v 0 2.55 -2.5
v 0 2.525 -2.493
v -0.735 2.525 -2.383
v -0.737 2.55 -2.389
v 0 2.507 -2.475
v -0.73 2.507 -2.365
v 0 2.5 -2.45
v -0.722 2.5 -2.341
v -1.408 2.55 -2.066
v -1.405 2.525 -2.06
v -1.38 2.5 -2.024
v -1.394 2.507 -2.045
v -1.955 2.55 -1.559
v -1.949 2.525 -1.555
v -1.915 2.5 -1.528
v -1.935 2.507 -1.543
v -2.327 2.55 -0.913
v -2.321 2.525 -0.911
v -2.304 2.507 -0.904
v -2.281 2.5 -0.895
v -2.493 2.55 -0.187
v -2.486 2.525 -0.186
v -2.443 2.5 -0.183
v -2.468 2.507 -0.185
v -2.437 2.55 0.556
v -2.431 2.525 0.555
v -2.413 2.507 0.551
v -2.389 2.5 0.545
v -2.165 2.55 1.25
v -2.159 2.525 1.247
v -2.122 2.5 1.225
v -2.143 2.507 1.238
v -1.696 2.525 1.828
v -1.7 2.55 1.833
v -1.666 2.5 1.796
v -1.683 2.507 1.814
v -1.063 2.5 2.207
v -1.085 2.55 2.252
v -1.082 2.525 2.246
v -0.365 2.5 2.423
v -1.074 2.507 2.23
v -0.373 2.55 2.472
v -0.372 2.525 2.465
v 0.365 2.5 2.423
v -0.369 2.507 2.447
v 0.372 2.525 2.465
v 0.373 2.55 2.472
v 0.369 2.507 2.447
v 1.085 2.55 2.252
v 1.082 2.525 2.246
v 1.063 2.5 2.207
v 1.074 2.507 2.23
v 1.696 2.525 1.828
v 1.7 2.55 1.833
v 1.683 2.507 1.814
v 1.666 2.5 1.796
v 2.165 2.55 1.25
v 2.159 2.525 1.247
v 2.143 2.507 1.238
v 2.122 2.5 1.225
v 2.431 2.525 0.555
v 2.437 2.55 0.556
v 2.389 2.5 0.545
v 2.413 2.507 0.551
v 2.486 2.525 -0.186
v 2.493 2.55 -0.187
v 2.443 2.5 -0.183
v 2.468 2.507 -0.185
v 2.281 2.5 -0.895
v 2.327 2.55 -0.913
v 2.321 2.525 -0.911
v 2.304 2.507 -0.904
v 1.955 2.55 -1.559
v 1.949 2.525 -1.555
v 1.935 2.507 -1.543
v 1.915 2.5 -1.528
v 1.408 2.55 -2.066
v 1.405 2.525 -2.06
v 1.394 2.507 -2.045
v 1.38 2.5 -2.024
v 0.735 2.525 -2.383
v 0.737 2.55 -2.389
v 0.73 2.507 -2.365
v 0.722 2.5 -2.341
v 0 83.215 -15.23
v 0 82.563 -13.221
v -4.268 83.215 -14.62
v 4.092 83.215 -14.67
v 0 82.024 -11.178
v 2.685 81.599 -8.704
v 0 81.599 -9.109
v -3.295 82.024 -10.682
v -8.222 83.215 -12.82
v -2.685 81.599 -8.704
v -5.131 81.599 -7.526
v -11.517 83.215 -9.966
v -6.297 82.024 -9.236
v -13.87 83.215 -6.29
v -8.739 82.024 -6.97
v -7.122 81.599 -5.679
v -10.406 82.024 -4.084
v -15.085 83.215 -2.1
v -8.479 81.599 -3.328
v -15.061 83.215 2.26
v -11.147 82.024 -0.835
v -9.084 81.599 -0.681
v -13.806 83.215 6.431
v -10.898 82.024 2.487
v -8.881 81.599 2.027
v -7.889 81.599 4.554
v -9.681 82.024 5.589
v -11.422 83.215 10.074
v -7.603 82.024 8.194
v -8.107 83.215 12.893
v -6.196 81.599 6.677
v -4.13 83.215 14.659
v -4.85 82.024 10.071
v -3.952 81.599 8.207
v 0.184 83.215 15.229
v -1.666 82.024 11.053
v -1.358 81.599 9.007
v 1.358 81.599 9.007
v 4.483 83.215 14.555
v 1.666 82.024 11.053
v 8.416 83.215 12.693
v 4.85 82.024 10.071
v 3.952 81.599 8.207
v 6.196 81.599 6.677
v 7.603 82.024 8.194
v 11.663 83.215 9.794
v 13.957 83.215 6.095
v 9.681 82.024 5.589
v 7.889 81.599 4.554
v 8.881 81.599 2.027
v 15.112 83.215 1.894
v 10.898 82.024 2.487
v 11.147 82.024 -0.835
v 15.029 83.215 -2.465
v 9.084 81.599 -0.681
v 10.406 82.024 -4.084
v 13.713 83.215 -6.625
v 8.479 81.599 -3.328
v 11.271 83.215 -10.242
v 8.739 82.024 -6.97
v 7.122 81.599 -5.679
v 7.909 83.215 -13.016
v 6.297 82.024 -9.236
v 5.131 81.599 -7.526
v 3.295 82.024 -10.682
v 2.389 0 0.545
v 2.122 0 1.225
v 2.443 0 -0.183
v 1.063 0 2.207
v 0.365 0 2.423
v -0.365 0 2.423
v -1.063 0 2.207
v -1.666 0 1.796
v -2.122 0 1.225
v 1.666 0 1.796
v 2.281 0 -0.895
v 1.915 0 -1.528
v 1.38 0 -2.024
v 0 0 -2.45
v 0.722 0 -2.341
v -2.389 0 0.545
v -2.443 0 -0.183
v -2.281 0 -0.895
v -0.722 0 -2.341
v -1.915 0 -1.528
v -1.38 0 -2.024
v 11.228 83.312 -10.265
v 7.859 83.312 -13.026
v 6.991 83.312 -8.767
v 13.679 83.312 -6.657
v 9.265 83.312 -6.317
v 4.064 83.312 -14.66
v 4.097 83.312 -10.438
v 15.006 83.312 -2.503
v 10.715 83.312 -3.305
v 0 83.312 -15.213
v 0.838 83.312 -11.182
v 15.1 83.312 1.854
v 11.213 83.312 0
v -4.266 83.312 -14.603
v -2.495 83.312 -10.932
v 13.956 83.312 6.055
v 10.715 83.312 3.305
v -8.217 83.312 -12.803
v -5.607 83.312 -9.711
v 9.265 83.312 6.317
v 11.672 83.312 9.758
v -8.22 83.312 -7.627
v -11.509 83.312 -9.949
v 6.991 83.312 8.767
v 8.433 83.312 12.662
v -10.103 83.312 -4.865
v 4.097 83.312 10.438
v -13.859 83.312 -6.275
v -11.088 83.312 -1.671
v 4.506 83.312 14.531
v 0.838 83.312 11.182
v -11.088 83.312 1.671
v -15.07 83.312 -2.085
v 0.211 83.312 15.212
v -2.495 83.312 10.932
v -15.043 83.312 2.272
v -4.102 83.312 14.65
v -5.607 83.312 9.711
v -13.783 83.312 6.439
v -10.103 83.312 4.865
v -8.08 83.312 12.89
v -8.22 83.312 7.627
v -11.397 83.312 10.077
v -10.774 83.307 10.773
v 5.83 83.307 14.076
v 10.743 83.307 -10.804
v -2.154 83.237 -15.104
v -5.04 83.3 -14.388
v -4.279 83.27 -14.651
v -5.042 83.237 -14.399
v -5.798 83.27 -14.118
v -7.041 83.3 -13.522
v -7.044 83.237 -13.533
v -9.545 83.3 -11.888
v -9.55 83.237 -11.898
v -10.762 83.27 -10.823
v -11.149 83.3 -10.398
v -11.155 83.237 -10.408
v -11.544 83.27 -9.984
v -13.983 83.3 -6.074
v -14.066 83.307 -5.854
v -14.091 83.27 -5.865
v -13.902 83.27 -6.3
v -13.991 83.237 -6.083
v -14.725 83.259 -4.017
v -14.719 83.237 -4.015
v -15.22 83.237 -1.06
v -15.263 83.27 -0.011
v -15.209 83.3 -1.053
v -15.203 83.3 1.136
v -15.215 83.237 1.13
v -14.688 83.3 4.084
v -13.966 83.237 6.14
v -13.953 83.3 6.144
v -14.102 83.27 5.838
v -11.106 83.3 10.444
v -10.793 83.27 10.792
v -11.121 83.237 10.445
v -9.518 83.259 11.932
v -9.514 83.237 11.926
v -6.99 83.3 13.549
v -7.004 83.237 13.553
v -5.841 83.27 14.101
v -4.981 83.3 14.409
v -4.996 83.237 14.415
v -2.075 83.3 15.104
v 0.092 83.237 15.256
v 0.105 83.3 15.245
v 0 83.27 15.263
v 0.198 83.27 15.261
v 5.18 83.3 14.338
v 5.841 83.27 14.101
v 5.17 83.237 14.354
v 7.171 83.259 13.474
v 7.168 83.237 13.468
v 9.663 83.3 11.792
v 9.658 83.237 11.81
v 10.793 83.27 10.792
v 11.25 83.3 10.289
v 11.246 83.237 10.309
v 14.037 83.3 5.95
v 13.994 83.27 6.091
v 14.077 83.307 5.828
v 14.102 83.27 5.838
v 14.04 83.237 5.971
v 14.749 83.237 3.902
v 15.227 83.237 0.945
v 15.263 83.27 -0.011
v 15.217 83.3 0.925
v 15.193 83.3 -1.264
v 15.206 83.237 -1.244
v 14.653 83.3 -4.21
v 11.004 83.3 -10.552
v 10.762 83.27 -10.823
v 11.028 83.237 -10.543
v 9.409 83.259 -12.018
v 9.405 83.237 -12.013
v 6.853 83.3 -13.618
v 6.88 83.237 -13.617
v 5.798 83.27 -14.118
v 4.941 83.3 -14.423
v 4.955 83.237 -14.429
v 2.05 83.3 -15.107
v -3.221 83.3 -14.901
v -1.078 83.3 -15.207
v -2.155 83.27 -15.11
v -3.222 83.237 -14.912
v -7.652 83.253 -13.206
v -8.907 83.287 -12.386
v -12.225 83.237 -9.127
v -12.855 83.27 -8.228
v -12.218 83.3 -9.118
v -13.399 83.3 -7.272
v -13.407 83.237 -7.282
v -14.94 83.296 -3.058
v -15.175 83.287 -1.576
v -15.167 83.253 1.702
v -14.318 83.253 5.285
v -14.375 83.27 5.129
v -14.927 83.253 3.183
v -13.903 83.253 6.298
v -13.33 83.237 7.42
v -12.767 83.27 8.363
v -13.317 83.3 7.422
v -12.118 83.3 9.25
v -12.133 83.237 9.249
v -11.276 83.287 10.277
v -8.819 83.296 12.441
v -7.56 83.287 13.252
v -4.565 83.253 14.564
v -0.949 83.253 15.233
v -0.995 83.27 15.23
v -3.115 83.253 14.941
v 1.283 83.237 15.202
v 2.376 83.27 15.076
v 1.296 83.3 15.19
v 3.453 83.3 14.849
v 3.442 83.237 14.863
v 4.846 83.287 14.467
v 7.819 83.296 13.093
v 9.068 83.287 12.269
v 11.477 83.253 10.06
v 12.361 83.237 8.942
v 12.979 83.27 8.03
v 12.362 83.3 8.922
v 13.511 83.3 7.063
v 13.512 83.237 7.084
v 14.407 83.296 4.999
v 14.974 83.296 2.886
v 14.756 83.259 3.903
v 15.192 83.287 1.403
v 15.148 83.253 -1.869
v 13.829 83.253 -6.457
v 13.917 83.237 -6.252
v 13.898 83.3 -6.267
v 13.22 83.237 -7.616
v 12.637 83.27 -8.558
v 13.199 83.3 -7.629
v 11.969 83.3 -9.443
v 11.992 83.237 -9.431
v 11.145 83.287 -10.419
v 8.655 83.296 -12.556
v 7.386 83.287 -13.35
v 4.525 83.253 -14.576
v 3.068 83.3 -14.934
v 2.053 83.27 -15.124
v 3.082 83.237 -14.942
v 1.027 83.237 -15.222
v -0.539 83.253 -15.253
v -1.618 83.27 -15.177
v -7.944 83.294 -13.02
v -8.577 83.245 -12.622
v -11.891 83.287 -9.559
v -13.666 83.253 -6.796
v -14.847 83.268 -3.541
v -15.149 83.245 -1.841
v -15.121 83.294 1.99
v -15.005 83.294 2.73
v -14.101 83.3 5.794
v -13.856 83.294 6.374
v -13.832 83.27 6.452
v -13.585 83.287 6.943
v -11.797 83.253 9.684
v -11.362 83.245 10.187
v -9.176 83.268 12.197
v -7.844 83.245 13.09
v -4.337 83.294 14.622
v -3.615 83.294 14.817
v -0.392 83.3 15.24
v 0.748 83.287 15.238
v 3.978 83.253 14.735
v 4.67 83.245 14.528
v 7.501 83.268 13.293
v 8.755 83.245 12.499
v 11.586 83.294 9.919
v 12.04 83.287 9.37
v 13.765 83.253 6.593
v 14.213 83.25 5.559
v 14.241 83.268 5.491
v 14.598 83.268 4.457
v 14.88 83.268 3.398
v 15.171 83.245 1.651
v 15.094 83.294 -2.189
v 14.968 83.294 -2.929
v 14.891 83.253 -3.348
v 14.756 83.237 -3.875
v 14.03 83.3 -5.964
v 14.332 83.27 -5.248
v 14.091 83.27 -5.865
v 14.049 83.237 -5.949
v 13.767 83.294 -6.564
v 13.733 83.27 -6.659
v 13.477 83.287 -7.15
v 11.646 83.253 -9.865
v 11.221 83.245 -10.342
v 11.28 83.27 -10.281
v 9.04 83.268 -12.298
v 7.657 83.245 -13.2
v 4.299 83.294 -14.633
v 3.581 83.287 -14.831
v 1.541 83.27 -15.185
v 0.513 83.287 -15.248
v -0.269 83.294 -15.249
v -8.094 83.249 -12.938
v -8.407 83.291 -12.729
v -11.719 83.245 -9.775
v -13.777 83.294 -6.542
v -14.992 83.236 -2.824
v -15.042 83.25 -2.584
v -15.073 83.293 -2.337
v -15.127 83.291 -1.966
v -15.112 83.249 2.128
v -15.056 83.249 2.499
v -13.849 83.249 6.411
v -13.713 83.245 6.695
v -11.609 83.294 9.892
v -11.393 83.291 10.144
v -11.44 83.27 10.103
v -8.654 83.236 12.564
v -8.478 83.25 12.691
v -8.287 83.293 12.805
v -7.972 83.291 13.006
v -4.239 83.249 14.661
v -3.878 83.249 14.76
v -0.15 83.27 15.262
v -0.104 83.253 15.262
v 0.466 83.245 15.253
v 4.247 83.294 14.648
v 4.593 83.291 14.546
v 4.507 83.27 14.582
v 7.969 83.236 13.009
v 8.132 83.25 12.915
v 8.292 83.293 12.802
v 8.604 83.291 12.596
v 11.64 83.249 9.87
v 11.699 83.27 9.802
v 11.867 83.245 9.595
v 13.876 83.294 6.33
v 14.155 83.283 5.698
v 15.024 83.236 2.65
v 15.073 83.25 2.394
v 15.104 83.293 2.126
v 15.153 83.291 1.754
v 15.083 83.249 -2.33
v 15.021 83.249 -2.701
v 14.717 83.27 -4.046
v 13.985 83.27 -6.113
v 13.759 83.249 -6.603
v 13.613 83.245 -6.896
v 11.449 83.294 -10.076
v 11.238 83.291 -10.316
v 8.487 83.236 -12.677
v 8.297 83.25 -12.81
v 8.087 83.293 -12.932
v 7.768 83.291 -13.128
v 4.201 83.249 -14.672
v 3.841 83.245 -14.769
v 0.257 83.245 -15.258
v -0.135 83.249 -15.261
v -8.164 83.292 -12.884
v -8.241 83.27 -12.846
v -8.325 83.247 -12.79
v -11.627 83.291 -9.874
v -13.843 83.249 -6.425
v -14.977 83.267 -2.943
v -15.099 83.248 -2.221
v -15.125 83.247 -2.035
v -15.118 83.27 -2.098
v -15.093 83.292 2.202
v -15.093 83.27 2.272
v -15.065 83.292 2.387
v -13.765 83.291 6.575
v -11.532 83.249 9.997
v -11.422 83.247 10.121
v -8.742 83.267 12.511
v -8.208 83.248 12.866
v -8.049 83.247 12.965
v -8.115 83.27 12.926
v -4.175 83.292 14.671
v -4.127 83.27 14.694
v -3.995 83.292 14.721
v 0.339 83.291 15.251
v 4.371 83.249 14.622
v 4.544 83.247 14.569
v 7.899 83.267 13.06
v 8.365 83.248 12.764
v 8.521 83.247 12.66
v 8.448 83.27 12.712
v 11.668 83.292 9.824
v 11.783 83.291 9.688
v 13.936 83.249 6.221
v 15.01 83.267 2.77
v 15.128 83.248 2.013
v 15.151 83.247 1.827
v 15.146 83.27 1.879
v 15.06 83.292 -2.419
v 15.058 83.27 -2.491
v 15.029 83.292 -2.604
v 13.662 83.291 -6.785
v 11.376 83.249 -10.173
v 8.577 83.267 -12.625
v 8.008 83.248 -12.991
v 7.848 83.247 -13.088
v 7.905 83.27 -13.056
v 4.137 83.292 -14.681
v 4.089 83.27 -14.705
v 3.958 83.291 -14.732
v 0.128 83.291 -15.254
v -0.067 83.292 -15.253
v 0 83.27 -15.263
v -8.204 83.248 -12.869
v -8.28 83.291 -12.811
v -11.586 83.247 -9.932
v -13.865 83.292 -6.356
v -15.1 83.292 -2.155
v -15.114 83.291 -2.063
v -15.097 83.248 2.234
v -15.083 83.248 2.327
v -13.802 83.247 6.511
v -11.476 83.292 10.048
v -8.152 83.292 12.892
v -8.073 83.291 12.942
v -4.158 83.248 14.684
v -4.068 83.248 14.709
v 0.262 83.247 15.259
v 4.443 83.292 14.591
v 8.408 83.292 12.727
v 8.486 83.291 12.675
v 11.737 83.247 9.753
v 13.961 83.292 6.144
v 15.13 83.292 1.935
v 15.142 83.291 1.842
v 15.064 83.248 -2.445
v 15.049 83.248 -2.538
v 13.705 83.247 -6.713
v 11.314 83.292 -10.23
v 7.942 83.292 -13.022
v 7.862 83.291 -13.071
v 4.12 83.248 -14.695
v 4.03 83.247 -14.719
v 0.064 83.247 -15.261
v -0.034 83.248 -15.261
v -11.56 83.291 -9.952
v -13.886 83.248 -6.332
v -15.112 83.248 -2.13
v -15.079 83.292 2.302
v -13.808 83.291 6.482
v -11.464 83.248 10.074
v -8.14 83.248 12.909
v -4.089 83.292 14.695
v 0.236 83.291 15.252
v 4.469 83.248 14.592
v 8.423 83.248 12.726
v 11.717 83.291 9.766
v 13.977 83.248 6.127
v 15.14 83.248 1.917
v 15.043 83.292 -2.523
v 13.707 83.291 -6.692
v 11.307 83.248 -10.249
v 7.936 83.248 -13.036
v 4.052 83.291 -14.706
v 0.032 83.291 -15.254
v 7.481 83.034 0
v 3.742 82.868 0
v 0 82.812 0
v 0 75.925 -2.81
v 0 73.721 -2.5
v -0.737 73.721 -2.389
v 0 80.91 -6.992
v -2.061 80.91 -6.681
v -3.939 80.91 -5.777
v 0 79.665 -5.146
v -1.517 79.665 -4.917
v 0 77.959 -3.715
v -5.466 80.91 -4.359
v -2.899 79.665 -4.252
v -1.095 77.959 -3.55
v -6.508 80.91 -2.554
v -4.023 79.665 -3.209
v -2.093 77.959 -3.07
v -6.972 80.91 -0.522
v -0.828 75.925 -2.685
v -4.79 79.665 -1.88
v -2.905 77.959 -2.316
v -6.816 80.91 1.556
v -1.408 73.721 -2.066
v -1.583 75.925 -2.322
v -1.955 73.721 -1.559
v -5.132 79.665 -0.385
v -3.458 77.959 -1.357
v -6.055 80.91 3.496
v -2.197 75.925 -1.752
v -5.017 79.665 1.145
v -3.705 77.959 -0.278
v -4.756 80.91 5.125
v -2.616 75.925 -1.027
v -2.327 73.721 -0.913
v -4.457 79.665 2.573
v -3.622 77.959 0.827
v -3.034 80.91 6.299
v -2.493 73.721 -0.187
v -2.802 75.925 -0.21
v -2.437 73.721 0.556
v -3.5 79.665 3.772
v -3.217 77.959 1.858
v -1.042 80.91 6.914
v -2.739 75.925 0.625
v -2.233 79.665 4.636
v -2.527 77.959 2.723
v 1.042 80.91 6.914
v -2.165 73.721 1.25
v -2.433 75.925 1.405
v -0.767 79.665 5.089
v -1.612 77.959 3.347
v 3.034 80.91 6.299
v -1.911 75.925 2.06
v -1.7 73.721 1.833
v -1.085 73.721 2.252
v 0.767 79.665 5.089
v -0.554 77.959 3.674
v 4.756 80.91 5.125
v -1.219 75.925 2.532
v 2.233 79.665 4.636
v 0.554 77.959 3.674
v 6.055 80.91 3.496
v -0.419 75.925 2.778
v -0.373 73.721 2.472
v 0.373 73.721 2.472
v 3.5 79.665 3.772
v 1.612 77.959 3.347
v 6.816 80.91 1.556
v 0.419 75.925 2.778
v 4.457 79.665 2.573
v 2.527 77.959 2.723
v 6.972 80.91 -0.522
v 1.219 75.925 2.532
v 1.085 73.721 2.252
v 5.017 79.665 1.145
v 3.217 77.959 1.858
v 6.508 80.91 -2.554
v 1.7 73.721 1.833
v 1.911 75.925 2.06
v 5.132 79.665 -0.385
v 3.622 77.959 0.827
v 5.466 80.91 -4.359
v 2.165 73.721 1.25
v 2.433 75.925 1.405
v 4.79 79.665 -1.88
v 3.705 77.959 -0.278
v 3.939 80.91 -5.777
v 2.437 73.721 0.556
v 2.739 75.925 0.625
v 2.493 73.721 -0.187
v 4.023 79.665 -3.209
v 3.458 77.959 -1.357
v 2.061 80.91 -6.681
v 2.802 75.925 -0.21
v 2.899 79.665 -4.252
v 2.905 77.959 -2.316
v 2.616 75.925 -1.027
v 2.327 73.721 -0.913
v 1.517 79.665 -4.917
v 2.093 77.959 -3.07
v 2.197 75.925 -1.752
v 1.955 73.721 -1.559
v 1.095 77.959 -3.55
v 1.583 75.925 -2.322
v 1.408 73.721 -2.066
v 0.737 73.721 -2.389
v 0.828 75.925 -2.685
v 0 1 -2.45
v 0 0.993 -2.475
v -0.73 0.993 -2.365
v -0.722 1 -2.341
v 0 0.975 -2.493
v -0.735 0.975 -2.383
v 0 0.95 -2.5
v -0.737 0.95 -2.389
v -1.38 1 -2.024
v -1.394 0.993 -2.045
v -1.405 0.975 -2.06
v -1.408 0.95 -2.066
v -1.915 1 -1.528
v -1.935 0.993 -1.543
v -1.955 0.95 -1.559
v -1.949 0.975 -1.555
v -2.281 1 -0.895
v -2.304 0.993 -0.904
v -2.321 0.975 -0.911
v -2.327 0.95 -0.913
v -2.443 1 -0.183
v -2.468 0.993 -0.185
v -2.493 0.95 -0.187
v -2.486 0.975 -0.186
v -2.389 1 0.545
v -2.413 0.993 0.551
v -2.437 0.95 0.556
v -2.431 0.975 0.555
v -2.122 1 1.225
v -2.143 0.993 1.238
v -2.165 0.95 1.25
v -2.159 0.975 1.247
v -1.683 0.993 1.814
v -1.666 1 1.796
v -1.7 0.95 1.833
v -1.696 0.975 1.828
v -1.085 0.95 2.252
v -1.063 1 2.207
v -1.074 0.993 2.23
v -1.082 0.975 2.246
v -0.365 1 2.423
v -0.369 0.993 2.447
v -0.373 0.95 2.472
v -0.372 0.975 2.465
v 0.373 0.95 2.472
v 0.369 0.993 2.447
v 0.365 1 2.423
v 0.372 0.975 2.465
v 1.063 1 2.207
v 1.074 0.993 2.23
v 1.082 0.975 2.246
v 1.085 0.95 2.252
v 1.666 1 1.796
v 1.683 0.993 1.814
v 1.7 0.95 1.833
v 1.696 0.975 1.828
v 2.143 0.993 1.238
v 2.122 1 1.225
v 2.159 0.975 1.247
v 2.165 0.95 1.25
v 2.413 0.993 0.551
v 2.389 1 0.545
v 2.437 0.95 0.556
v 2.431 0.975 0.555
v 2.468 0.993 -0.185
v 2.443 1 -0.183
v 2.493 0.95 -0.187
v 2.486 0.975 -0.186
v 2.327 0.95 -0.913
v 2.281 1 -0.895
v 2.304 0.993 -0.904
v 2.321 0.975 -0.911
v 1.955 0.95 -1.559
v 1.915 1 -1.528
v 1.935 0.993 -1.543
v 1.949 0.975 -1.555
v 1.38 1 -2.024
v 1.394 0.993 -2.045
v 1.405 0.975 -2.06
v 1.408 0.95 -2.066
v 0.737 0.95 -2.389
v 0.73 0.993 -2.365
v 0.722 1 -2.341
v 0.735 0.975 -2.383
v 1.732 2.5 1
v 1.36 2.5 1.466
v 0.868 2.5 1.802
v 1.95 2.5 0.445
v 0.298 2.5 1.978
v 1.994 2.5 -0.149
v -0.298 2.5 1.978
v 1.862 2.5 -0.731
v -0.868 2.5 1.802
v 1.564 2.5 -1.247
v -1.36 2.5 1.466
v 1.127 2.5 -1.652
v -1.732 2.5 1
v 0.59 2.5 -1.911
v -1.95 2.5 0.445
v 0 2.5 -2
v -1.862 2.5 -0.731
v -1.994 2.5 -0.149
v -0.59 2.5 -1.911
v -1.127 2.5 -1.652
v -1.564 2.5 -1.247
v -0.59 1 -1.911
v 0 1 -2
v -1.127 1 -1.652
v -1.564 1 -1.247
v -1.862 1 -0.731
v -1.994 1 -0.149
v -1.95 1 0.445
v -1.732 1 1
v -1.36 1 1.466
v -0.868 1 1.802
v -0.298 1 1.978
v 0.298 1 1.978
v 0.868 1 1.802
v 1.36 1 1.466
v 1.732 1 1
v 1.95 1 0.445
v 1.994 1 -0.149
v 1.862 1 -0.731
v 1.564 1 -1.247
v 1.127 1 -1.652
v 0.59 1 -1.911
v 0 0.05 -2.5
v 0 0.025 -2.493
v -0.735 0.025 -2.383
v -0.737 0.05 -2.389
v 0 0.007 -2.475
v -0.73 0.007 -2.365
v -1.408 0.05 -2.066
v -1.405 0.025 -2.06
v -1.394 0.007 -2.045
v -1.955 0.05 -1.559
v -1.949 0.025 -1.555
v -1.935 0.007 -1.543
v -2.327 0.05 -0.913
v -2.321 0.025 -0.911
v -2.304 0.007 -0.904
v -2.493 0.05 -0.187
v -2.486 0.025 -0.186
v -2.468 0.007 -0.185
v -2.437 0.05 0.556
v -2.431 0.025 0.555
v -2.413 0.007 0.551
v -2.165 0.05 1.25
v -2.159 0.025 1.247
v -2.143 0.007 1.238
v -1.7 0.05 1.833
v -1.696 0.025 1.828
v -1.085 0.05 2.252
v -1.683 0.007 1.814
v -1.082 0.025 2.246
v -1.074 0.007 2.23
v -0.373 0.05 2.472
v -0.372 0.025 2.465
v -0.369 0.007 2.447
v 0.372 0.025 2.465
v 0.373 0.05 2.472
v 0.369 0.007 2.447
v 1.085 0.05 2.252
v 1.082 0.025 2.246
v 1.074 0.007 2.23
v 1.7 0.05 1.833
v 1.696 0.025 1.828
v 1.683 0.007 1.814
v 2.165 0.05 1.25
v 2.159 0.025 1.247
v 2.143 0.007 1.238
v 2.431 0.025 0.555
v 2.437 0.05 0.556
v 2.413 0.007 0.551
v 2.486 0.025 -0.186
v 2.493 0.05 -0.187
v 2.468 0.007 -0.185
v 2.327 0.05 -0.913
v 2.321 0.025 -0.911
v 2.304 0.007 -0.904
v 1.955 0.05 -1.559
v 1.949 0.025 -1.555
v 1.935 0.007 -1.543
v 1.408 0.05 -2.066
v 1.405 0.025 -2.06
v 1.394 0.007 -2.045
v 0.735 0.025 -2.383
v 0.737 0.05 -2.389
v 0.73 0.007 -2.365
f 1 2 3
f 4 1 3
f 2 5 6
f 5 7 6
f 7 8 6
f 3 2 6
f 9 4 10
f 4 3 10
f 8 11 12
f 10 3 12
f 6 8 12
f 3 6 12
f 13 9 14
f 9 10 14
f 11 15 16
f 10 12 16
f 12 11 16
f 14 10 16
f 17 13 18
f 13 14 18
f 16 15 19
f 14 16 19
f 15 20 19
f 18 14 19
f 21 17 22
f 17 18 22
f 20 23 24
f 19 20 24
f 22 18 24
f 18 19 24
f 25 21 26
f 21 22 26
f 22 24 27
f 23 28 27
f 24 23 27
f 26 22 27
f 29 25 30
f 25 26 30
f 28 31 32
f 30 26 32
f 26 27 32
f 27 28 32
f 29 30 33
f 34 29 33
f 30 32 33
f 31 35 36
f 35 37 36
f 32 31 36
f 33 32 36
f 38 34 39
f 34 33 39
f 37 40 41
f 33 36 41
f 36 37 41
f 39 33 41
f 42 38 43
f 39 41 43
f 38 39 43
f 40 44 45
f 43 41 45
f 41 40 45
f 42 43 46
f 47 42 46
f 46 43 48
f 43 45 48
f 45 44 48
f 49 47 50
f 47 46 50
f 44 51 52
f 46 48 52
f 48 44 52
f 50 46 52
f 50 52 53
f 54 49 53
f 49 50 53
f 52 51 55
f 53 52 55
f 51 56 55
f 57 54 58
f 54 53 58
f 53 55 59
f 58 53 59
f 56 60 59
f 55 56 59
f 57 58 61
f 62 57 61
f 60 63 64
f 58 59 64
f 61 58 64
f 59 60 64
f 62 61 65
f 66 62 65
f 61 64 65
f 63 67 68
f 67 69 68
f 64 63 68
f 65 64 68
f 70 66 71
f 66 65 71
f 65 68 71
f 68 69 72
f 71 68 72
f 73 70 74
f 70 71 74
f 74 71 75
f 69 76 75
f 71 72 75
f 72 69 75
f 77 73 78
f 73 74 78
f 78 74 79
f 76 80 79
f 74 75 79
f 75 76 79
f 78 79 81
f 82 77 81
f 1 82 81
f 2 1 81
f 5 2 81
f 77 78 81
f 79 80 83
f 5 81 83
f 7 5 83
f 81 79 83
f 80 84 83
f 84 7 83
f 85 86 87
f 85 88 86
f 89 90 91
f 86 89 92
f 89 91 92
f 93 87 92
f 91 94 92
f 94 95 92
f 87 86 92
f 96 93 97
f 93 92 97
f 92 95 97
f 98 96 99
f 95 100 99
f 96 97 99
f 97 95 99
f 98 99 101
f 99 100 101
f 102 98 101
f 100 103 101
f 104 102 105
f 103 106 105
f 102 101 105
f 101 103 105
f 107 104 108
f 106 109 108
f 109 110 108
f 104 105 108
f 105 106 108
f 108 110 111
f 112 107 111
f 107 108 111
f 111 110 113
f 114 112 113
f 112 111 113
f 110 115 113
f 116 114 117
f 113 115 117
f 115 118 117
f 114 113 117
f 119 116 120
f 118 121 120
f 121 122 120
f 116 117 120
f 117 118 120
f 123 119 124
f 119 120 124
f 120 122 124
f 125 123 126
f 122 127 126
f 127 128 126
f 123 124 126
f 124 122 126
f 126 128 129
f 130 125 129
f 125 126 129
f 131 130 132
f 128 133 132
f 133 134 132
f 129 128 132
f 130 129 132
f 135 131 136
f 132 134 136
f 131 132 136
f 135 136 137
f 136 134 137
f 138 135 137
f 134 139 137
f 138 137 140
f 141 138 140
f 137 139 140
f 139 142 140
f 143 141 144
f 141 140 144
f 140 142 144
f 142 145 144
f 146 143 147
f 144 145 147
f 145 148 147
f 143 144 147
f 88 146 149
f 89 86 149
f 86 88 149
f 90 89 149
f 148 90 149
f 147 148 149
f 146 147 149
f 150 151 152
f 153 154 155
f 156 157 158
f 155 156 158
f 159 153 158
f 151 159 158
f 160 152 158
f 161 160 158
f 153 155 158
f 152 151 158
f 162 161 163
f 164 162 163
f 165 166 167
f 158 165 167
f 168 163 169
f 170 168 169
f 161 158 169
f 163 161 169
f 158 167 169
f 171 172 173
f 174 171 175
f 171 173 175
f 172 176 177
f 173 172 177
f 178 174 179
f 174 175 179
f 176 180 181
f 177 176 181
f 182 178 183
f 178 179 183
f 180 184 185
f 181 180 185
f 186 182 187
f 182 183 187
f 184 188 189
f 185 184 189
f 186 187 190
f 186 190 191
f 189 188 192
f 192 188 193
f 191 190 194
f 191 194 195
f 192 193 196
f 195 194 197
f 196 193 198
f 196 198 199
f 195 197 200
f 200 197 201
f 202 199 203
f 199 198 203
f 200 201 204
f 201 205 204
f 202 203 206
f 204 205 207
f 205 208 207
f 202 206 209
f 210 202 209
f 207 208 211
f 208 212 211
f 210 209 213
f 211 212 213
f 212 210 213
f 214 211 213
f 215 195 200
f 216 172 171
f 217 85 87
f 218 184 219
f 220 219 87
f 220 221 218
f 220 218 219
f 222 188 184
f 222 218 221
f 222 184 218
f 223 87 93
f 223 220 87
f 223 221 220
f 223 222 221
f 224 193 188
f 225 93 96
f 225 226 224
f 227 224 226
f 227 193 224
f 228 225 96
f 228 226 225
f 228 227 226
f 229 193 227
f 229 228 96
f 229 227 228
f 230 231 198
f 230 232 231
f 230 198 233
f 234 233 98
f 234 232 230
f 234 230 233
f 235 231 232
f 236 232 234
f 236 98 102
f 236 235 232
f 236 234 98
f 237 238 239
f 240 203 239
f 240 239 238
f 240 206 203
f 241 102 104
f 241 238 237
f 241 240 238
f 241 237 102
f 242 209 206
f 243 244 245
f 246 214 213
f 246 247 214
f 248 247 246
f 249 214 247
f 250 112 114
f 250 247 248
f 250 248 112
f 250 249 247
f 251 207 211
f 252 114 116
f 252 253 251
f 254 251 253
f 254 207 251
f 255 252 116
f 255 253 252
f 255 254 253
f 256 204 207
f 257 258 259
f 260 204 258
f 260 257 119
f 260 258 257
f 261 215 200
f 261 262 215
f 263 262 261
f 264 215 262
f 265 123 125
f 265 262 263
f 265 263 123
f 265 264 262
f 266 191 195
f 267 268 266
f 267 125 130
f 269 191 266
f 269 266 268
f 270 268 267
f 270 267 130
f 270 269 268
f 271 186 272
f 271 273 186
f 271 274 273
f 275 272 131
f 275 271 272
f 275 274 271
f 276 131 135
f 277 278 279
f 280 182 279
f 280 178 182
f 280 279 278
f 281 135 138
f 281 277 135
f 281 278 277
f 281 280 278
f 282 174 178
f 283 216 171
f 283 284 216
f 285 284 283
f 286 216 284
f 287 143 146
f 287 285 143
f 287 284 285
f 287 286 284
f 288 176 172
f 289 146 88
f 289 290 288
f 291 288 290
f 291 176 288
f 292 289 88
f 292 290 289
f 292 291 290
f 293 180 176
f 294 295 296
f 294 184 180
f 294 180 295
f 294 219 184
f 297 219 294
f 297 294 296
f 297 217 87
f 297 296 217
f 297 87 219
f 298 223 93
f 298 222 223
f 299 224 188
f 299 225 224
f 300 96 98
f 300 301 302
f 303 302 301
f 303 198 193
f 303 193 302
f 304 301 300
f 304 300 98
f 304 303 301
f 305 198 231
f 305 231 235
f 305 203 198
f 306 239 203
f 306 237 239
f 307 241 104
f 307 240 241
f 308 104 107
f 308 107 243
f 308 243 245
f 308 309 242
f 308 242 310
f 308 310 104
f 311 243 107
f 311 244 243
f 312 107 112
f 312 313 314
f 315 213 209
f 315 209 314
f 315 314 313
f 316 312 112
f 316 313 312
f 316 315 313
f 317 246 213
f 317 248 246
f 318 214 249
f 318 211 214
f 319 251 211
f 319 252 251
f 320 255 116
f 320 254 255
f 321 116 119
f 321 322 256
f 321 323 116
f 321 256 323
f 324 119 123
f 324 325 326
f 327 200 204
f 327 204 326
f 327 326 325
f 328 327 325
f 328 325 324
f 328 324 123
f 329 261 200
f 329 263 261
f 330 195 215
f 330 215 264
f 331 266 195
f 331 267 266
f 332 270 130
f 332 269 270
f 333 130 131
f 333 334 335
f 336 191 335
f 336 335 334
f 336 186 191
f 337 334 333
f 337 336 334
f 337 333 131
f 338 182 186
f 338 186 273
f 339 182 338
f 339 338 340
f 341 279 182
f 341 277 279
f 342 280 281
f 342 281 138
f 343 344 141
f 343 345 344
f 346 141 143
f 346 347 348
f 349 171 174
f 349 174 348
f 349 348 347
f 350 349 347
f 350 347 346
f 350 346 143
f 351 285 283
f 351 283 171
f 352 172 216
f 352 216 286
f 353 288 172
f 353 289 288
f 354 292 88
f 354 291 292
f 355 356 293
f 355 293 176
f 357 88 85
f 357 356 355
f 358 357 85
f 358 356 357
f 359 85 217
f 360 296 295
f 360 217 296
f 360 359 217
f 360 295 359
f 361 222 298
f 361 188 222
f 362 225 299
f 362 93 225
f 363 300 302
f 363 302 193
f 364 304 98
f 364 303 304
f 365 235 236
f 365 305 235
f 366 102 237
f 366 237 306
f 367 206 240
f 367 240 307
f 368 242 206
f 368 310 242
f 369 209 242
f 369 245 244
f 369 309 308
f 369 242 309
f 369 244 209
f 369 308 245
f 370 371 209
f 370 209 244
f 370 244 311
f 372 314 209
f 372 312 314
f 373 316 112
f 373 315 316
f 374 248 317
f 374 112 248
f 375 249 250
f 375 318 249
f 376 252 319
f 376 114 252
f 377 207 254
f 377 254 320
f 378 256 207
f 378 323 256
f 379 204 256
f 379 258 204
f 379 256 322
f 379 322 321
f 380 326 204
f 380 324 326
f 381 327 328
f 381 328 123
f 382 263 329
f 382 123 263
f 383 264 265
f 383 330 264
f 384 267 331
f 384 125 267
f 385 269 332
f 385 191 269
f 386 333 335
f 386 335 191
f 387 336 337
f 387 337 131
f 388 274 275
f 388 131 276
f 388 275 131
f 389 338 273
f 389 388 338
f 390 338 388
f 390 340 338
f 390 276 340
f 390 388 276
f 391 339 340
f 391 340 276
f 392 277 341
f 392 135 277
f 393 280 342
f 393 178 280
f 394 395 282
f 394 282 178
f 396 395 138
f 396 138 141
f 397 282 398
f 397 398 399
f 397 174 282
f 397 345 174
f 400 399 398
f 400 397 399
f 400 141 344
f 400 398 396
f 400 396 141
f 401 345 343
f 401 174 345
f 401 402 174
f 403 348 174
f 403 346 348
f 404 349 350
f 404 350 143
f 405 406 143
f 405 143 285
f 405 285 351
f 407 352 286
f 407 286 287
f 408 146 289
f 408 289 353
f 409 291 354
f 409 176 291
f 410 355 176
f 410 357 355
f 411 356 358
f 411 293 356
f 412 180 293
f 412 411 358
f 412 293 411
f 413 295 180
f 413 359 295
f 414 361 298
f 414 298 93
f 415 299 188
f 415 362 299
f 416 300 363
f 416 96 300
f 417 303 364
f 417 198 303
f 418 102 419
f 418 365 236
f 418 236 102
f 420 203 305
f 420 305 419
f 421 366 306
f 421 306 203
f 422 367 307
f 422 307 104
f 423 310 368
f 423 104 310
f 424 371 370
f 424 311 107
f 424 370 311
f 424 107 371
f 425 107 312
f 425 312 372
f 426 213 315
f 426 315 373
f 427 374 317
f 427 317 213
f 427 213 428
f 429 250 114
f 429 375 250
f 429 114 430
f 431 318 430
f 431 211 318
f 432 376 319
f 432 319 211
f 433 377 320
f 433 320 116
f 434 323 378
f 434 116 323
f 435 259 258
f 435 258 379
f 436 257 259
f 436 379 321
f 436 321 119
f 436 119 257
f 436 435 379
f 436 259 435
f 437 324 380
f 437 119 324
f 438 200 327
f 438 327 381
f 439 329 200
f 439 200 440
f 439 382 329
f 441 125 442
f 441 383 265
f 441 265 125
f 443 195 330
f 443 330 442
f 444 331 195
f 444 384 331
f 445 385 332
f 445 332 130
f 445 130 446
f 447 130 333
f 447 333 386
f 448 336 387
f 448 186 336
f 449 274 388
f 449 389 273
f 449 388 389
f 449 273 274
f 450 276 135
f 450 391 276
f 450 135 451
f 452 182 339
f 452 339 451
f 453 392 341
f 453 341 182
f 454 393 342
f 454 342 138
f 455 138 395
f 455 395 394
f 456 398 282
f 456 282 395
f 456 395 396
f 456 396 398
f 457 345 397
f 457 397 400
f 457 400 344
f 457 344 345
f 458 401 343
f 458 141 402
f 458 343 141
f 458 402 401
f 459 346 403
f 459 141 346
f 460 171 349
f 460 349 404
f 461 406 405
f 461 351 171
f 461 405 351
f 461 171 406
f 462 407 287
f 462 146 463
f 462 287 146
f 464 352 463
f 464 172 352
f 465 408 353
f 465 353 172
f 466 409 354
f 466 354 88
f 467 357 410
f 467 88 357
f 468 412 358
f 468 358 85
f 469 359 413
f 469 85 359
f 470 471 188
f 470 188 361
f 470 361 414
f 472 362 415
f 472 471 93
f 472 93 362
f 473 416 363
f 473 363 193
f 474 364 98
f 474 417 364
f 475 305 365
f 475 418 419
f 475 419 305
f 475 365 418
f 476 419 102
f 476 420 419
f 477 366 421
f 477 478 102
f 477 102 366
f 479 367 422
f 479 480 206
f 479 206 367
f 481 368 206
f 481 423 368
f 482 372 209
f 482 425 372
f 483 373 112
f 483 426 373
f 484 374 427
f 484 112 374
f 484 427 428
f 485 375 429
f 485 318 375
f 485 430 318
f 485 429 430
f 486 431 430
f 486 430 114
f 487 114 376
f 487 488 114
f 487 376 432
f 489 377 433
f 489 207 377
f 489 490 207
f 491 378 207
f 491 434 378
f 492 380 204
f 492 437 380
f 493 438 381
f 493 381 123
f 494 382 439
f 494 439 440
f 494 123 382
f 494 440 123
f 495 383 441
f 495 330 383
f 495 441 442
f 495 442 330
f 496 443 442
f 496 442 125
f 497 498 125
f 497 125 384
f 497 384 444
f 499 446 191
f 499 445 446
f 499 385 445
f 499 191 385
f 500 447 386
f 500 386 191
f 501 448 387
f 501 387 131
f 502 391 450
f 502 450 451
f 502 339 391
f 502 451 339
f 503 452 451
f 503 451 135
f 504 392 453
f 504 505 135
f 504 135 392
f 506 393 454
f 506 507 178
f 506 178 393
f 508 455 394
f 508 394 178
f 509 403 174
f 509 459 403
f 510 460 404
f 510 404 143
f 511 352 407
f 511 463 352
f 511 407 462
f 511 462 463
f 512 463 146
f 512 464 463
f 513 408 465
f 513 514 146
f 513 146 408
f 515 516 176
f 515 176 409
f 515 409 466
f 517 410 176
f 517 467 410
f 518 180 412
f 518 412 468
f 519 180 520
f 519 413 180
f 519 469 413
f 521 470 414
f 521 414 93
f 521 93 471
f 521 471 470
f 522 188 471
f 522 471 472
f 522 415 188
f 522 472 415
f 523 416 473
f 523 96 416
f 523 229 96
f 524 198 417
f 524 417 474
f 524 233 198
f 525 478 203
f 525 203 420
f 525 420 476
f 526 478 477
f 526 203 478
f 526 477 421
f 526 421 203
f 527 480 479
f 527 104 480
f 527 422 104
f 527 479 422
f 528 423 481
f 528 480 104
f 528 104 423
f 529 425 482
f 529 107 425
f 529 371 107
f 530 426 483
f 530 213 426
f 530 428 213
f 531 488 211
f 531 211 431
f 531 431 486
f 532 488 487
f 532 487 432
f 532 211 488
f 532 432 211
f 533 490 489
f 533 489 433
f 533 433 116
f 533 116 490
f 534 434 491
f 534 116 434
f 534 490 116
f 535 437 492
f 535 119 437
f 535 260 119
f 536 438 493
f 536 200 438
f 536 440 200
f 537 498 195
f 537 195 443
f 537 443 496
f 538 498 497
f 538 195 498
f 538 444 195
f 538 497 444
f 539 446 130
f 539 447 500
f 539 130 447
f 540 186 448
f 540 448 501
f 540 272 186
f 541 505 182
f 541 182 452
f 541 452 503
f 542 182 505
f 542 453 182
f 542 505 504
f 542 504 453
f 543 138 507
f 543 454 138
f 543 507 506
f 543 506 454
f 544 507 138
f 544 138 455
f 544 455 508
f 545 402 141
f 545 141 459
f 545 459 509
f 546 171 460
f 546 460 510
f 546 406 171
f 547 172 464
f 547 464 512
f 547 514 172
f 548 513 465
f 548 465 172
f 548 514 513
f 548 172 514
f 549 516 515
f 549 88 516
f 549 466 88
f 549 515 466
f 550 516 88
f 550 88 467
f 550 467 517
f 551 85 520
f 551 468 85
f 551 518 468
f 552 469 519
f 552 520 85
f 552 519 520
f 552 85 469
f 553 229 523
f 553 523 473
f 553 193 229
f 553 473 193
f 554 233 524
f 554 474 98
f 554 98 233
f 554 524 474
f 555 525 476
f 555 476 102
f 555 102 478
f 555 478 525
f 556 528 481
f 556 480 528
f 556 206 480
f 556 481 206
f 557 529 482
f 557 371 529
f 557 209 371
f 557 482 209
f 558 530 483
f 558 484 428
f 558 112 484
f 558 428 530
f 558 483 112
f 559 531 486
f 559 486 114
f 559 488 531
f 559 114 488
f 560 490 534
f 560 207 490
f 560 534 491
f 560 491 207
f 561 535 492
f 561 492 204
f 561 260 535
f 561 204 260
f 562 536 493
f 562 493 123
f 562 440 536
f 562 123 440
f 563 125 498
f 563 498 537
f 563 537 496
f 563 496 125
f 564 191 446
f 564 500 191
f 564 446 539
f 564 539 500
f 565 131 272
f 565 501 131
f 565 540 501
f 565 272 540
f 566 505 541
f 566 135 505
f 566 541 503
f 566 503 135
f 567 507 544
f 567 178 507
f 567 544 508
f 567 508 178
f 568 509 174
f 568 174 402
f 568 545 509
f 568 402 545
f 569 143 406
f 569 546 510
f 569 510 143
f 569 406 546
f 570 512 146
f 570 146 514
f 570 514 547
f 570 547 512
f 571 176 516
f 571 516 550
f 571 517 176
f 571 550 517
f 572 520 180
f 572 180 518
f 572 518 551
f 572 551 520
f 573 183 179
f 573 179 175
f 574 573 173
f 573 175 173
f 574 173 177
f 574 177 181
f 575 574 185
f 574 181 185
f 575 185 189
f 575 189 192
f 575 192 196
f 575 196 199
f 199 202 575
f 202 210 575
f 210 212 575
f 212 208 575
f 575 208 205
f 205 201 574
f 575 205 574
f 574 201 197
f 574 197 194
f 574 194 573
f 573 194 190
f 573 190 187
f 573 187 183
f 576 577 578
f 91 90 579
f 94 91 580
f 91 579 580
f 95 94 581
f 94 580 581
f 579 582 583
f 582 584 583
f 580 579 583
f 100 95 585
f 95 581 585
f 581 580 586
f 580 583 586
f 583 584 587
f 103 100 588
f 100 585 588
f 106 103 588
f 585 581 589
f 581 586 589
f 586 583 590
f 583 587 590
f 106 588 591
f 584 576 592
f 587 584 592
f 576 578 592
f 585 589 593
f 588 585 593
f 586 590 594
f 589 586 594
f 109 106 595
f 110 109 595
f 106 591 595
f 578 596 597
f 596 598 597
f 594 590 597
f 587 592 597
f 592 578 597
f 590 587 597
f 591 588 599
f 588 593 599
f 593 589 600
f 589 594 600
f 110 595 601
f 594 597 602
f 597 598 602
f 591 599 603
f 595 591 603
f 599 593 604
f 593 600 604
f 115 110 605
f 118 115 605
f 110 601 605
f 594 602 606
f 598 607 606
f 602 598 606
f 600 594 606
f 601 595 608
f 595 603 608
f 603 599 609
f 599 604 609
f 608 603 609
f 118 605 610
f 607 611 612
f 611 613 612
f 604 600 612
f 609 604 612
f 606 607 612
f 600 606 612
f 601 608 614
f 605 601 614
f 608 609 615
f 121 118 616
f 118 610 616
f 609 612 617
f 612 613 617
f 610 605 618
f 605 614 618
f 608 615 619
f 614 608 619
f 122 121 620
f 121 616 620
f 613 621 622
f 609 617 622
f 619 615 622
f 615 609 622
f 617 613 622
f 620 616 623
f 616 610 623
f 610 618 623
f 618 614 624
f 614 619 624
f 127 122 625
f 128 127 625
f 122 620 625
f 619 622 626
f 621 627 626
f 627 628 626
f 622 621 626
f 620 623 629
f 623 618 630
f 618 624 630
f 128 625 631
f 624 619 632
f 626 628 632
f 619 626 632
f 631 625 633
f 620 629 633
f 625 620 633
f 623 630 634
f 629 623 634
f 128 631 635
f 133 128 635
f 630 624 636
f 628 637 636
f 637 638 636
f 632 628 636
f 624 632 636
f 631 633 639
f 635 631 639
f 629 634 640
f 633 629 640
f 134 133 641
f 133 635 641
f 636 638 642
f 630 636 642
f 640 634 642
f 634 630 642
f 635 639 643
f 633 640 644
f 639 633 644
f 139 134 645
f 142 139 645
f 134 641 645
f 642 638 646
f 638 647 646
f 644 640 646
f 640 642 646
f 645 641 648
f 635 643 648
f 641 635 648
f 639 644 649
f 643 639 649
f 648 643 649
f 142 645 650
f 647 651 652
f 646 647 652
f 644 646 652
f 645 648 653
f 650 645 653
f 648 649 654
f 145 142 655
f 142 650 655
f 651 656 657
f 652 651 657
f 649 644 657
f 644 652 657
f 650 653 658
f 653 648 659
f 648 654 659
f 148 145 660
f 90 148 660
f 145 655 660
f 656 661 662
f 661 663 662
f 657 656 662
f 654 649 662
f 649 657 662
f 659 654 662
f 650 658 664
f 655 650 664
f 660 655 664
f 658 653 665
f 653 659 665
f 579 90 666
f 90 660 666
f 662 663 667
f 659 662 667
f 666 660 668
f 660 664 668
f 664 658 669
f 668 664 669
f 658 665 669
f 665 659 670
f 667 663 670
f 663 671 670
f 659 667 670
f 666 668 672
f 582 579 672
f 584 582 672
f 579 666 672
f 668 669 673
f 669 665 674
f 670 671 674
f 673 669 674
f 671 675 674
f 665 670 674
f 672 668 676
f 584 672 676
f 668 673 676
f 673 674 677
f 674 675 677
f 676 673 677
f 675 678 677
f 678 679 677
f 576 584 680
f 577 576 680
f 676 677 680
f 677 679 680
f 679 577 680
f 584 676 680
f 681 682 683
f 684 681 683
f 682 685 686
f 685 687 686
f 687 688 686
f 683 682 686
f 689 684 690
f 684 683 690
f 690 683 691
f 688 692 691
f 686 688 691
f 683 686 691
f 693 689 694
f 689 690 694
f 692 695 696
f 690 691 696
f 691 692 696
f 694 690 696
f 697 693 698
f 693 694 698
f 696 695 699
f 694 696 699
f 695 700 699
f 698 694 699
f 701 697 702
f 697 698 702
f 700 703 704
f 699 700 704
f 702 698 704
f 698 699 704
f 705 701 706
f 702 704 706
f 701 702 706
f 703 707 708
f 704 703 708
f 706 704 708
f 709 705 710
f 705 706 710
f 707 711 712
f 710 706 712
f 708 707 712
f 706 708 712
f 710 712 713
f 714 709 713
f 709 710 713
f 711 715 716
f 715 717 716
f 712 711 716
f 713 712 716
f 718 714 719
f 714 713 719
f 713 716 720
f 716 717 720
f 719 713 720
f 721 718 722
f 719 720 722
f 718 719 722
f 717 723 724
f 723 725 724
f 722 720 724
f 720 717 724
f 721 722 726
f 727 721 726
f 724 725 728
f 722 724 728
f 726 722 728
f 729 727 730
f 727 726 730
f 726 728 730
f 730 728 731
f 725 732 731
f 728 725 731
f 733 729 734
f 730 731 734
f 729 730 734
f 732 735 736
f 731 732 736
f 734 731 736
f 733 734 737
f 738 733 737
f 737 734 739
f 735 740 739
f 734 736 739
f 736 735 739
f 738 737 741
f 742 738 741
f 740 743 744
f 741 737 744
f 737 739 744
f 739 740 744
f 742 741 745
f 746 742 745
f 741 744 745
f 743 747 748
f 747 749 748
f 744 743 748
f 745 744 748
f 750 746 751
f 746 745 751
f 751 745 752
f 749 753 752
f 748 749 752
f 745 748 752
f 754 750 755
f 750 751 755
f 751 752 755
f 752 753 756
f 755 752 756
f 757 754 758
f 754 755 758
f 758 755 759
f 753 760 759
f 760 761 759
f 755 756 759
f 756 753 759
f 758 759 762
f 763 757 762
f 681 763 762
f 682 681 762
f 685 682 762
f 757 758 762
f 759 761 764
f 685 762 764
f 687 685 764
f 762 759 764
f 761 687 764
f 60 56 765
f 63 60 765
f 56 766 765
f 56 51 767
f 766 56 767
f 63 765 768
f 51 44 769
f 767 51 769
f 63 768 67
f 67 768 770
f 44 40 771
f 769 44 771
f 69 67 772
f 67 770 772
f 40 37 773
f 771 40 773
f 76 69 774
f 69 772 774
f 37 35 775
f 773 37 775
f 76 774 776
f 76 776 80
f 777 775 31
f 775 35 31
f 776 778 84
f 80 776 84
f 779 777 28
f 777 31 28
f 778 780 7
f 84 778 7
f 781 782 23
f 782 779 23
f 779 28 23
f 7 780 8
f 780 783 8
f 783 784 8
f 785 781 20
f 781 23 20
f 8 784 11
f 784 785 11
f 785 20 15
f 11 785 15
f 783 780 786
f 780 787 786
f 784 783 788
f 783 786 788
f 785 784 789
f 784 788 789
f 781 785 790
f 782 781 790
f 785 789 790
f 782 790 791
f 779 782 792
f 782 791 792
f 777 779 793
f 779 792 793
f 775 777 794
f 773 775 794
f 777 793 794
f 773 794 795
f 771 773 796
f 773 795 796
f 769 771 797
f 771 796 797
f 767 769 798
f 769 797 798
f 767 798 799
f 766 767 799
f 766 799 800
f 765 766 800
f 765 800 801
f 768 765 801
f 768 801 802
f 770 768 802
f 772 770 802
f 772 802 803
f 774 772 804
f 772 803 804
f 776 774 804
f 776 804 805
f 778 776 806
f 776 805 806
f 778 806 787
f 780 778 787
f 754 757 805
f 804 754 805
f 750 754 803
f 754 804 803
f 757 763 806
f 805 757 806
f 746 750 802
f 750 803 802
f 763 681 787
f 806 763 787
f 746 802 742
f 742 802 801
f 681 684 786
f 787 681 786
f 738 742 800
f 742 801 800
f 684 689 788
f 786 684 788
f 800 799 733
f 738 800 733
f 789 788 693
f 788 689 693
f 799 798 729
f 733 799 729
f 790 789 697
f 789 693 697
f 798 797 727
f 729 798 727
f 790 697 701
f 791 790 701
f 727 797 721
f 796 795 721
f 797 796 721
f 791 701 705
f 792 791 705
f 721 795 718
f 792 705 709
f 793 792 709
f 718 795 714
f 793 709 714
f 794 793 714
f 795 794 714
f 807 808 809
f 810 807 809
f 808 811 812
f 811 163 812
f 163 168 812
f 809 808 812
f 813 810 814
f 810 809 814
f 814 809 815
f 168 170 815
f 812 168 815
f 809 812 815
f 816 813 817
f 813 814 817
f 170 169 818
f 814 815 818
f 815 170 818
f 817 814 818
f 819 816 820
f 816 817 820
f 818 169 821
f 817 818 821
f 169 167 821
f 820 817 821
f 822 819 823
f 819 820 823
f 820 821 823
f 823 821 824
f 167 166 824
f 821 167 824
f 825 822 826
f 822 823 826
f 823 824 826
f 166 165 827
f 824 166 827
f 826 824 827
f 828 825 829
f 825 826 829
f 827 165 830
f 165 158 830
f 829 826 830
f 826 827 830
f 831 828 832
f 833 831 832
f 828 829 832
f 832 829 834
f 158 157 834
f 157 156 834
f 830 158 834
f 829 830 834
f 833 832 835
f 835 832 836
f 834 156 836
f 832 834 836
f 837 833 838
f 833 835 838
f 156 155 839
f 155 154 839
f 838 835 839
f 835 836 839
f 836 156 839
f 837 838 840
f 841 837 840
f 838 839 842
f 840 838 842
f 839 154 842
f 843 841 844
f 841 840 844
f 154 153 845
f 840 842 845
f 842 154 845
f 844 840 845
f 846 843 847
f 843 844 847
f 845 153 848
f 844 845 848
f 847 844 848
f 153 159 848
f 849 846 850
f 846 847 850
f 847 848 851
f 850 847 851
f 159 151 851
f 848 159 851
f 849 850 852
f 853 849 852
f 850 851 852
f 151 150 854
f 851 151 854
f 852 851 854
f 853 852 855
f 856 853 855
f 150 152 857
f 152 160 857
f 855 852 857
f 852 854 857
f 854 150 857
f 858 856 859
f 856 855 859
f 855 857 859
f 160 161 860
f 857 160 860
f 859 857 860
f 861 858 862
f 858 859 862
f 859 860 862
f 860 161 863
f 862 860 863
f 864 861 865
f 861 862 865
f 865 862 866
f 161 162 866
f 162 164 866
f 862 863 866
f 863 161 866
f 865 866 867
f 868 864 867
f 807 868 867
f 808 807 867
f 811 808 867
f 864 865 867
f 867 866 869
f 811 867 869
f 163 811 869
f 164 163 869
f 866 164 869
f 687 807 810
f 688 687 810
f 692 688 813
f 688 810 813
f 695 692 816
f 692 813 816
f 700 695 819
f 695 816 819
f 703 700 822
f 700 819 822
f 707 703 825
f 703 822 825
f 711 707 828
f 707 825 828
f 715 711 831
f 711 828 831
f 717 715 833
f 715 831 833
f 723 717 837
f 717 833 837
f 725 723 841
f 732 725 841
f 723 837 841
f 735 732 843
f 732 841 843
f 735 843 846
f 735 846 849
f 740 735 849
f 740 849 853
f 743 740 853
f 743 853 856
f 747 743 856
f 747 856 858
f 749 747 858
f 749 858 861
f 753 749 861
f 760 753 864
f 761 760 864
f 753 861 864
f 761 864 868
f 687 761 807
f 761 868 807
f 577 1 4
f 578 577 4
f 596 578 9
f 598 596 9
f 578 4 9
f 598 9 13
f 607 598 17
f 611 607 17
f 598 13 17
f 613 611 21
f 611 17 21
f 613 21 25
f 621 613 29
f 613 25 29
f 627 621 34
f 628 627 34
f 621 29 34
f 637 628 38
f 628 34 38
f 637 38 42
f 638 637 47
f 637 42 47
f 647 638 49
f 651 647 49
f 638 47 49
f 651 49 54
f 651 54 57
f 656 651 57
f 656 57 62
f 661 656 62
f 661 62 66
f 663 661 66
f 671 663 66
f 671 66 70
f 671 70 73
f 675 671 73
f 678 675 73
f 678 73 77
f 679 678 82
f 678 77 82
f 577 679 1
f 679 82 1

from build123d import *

# Parameters (mm, degrees)
FILLET1_R = 0.05


# Read off the part's stored shape, not the designer's step: Dome1
with BuildPart() as part:
    # Sketch1 → Revolve1 (revolve)
    with BuildSketch(Plane.XY, mode=Mode.PRIVATE) as revolve1_sk:
        with BuildLine():
            Line((0, 0), (0, 83.312))
            Line((0, 83.312), (-15.5, 83.312))
            ThreePointArc((-15.5, 83.312), (-12.341842281, 82.316034739), (-9.108981634, 81.598734928))
            ThreePointArc((-9.108981634, 81.598734928), (-4.371046299, 78.862184261), (-2.5, 73.720596322))
            Line((-2.5, 73.720596322), (-2.5, 2.5))
            Line((-2.5, 2.5), (-2, 2.5))
            Line((-2, 2.5), (-2, 1))
            Line((-2, 1), (-2.5, 1))
            Line((-2.5, 1), (-2.5, 0))
            Line((-2.5, 0), (0, 0))
        make_face()
    revolve(revolve1_sk.sketch.rotate(Axis((0, 0, 0), (0, 1, 0)), 270), axis=Axis((0, 0, 0), (0, 1, 0)))

    # Fillet1
    fillet1_edges = [part.edges().sort_by_distance(p)[0] for p in [
        (0, 83.312, 15.5),
        (0, 0, 2.5),
        (0, 1, 2.5),
        (0, 2.5, 2.5),
    ]]
    fillet(fillet1_edges, radius=FILLET1_R)

    # Dome1 outline → Dome1 (revolve, cut)
    with BuildSketch(Plane.XY):
        with BuildLine():
            Line((0, 83.312000011), (0, 82.812))
            ThreePointArc((0, 82.812), (5.612208004, 82.937062075), (11.21327404, 83.312000011))
            Line((11.21327404, 83.312000011), (0, 83.312000011))
        make_face()
    revolve(axis=Axis((0, 0, 0), (0, 1, 0)), mode=Mode.SUBTRACT)


solid = part.part
